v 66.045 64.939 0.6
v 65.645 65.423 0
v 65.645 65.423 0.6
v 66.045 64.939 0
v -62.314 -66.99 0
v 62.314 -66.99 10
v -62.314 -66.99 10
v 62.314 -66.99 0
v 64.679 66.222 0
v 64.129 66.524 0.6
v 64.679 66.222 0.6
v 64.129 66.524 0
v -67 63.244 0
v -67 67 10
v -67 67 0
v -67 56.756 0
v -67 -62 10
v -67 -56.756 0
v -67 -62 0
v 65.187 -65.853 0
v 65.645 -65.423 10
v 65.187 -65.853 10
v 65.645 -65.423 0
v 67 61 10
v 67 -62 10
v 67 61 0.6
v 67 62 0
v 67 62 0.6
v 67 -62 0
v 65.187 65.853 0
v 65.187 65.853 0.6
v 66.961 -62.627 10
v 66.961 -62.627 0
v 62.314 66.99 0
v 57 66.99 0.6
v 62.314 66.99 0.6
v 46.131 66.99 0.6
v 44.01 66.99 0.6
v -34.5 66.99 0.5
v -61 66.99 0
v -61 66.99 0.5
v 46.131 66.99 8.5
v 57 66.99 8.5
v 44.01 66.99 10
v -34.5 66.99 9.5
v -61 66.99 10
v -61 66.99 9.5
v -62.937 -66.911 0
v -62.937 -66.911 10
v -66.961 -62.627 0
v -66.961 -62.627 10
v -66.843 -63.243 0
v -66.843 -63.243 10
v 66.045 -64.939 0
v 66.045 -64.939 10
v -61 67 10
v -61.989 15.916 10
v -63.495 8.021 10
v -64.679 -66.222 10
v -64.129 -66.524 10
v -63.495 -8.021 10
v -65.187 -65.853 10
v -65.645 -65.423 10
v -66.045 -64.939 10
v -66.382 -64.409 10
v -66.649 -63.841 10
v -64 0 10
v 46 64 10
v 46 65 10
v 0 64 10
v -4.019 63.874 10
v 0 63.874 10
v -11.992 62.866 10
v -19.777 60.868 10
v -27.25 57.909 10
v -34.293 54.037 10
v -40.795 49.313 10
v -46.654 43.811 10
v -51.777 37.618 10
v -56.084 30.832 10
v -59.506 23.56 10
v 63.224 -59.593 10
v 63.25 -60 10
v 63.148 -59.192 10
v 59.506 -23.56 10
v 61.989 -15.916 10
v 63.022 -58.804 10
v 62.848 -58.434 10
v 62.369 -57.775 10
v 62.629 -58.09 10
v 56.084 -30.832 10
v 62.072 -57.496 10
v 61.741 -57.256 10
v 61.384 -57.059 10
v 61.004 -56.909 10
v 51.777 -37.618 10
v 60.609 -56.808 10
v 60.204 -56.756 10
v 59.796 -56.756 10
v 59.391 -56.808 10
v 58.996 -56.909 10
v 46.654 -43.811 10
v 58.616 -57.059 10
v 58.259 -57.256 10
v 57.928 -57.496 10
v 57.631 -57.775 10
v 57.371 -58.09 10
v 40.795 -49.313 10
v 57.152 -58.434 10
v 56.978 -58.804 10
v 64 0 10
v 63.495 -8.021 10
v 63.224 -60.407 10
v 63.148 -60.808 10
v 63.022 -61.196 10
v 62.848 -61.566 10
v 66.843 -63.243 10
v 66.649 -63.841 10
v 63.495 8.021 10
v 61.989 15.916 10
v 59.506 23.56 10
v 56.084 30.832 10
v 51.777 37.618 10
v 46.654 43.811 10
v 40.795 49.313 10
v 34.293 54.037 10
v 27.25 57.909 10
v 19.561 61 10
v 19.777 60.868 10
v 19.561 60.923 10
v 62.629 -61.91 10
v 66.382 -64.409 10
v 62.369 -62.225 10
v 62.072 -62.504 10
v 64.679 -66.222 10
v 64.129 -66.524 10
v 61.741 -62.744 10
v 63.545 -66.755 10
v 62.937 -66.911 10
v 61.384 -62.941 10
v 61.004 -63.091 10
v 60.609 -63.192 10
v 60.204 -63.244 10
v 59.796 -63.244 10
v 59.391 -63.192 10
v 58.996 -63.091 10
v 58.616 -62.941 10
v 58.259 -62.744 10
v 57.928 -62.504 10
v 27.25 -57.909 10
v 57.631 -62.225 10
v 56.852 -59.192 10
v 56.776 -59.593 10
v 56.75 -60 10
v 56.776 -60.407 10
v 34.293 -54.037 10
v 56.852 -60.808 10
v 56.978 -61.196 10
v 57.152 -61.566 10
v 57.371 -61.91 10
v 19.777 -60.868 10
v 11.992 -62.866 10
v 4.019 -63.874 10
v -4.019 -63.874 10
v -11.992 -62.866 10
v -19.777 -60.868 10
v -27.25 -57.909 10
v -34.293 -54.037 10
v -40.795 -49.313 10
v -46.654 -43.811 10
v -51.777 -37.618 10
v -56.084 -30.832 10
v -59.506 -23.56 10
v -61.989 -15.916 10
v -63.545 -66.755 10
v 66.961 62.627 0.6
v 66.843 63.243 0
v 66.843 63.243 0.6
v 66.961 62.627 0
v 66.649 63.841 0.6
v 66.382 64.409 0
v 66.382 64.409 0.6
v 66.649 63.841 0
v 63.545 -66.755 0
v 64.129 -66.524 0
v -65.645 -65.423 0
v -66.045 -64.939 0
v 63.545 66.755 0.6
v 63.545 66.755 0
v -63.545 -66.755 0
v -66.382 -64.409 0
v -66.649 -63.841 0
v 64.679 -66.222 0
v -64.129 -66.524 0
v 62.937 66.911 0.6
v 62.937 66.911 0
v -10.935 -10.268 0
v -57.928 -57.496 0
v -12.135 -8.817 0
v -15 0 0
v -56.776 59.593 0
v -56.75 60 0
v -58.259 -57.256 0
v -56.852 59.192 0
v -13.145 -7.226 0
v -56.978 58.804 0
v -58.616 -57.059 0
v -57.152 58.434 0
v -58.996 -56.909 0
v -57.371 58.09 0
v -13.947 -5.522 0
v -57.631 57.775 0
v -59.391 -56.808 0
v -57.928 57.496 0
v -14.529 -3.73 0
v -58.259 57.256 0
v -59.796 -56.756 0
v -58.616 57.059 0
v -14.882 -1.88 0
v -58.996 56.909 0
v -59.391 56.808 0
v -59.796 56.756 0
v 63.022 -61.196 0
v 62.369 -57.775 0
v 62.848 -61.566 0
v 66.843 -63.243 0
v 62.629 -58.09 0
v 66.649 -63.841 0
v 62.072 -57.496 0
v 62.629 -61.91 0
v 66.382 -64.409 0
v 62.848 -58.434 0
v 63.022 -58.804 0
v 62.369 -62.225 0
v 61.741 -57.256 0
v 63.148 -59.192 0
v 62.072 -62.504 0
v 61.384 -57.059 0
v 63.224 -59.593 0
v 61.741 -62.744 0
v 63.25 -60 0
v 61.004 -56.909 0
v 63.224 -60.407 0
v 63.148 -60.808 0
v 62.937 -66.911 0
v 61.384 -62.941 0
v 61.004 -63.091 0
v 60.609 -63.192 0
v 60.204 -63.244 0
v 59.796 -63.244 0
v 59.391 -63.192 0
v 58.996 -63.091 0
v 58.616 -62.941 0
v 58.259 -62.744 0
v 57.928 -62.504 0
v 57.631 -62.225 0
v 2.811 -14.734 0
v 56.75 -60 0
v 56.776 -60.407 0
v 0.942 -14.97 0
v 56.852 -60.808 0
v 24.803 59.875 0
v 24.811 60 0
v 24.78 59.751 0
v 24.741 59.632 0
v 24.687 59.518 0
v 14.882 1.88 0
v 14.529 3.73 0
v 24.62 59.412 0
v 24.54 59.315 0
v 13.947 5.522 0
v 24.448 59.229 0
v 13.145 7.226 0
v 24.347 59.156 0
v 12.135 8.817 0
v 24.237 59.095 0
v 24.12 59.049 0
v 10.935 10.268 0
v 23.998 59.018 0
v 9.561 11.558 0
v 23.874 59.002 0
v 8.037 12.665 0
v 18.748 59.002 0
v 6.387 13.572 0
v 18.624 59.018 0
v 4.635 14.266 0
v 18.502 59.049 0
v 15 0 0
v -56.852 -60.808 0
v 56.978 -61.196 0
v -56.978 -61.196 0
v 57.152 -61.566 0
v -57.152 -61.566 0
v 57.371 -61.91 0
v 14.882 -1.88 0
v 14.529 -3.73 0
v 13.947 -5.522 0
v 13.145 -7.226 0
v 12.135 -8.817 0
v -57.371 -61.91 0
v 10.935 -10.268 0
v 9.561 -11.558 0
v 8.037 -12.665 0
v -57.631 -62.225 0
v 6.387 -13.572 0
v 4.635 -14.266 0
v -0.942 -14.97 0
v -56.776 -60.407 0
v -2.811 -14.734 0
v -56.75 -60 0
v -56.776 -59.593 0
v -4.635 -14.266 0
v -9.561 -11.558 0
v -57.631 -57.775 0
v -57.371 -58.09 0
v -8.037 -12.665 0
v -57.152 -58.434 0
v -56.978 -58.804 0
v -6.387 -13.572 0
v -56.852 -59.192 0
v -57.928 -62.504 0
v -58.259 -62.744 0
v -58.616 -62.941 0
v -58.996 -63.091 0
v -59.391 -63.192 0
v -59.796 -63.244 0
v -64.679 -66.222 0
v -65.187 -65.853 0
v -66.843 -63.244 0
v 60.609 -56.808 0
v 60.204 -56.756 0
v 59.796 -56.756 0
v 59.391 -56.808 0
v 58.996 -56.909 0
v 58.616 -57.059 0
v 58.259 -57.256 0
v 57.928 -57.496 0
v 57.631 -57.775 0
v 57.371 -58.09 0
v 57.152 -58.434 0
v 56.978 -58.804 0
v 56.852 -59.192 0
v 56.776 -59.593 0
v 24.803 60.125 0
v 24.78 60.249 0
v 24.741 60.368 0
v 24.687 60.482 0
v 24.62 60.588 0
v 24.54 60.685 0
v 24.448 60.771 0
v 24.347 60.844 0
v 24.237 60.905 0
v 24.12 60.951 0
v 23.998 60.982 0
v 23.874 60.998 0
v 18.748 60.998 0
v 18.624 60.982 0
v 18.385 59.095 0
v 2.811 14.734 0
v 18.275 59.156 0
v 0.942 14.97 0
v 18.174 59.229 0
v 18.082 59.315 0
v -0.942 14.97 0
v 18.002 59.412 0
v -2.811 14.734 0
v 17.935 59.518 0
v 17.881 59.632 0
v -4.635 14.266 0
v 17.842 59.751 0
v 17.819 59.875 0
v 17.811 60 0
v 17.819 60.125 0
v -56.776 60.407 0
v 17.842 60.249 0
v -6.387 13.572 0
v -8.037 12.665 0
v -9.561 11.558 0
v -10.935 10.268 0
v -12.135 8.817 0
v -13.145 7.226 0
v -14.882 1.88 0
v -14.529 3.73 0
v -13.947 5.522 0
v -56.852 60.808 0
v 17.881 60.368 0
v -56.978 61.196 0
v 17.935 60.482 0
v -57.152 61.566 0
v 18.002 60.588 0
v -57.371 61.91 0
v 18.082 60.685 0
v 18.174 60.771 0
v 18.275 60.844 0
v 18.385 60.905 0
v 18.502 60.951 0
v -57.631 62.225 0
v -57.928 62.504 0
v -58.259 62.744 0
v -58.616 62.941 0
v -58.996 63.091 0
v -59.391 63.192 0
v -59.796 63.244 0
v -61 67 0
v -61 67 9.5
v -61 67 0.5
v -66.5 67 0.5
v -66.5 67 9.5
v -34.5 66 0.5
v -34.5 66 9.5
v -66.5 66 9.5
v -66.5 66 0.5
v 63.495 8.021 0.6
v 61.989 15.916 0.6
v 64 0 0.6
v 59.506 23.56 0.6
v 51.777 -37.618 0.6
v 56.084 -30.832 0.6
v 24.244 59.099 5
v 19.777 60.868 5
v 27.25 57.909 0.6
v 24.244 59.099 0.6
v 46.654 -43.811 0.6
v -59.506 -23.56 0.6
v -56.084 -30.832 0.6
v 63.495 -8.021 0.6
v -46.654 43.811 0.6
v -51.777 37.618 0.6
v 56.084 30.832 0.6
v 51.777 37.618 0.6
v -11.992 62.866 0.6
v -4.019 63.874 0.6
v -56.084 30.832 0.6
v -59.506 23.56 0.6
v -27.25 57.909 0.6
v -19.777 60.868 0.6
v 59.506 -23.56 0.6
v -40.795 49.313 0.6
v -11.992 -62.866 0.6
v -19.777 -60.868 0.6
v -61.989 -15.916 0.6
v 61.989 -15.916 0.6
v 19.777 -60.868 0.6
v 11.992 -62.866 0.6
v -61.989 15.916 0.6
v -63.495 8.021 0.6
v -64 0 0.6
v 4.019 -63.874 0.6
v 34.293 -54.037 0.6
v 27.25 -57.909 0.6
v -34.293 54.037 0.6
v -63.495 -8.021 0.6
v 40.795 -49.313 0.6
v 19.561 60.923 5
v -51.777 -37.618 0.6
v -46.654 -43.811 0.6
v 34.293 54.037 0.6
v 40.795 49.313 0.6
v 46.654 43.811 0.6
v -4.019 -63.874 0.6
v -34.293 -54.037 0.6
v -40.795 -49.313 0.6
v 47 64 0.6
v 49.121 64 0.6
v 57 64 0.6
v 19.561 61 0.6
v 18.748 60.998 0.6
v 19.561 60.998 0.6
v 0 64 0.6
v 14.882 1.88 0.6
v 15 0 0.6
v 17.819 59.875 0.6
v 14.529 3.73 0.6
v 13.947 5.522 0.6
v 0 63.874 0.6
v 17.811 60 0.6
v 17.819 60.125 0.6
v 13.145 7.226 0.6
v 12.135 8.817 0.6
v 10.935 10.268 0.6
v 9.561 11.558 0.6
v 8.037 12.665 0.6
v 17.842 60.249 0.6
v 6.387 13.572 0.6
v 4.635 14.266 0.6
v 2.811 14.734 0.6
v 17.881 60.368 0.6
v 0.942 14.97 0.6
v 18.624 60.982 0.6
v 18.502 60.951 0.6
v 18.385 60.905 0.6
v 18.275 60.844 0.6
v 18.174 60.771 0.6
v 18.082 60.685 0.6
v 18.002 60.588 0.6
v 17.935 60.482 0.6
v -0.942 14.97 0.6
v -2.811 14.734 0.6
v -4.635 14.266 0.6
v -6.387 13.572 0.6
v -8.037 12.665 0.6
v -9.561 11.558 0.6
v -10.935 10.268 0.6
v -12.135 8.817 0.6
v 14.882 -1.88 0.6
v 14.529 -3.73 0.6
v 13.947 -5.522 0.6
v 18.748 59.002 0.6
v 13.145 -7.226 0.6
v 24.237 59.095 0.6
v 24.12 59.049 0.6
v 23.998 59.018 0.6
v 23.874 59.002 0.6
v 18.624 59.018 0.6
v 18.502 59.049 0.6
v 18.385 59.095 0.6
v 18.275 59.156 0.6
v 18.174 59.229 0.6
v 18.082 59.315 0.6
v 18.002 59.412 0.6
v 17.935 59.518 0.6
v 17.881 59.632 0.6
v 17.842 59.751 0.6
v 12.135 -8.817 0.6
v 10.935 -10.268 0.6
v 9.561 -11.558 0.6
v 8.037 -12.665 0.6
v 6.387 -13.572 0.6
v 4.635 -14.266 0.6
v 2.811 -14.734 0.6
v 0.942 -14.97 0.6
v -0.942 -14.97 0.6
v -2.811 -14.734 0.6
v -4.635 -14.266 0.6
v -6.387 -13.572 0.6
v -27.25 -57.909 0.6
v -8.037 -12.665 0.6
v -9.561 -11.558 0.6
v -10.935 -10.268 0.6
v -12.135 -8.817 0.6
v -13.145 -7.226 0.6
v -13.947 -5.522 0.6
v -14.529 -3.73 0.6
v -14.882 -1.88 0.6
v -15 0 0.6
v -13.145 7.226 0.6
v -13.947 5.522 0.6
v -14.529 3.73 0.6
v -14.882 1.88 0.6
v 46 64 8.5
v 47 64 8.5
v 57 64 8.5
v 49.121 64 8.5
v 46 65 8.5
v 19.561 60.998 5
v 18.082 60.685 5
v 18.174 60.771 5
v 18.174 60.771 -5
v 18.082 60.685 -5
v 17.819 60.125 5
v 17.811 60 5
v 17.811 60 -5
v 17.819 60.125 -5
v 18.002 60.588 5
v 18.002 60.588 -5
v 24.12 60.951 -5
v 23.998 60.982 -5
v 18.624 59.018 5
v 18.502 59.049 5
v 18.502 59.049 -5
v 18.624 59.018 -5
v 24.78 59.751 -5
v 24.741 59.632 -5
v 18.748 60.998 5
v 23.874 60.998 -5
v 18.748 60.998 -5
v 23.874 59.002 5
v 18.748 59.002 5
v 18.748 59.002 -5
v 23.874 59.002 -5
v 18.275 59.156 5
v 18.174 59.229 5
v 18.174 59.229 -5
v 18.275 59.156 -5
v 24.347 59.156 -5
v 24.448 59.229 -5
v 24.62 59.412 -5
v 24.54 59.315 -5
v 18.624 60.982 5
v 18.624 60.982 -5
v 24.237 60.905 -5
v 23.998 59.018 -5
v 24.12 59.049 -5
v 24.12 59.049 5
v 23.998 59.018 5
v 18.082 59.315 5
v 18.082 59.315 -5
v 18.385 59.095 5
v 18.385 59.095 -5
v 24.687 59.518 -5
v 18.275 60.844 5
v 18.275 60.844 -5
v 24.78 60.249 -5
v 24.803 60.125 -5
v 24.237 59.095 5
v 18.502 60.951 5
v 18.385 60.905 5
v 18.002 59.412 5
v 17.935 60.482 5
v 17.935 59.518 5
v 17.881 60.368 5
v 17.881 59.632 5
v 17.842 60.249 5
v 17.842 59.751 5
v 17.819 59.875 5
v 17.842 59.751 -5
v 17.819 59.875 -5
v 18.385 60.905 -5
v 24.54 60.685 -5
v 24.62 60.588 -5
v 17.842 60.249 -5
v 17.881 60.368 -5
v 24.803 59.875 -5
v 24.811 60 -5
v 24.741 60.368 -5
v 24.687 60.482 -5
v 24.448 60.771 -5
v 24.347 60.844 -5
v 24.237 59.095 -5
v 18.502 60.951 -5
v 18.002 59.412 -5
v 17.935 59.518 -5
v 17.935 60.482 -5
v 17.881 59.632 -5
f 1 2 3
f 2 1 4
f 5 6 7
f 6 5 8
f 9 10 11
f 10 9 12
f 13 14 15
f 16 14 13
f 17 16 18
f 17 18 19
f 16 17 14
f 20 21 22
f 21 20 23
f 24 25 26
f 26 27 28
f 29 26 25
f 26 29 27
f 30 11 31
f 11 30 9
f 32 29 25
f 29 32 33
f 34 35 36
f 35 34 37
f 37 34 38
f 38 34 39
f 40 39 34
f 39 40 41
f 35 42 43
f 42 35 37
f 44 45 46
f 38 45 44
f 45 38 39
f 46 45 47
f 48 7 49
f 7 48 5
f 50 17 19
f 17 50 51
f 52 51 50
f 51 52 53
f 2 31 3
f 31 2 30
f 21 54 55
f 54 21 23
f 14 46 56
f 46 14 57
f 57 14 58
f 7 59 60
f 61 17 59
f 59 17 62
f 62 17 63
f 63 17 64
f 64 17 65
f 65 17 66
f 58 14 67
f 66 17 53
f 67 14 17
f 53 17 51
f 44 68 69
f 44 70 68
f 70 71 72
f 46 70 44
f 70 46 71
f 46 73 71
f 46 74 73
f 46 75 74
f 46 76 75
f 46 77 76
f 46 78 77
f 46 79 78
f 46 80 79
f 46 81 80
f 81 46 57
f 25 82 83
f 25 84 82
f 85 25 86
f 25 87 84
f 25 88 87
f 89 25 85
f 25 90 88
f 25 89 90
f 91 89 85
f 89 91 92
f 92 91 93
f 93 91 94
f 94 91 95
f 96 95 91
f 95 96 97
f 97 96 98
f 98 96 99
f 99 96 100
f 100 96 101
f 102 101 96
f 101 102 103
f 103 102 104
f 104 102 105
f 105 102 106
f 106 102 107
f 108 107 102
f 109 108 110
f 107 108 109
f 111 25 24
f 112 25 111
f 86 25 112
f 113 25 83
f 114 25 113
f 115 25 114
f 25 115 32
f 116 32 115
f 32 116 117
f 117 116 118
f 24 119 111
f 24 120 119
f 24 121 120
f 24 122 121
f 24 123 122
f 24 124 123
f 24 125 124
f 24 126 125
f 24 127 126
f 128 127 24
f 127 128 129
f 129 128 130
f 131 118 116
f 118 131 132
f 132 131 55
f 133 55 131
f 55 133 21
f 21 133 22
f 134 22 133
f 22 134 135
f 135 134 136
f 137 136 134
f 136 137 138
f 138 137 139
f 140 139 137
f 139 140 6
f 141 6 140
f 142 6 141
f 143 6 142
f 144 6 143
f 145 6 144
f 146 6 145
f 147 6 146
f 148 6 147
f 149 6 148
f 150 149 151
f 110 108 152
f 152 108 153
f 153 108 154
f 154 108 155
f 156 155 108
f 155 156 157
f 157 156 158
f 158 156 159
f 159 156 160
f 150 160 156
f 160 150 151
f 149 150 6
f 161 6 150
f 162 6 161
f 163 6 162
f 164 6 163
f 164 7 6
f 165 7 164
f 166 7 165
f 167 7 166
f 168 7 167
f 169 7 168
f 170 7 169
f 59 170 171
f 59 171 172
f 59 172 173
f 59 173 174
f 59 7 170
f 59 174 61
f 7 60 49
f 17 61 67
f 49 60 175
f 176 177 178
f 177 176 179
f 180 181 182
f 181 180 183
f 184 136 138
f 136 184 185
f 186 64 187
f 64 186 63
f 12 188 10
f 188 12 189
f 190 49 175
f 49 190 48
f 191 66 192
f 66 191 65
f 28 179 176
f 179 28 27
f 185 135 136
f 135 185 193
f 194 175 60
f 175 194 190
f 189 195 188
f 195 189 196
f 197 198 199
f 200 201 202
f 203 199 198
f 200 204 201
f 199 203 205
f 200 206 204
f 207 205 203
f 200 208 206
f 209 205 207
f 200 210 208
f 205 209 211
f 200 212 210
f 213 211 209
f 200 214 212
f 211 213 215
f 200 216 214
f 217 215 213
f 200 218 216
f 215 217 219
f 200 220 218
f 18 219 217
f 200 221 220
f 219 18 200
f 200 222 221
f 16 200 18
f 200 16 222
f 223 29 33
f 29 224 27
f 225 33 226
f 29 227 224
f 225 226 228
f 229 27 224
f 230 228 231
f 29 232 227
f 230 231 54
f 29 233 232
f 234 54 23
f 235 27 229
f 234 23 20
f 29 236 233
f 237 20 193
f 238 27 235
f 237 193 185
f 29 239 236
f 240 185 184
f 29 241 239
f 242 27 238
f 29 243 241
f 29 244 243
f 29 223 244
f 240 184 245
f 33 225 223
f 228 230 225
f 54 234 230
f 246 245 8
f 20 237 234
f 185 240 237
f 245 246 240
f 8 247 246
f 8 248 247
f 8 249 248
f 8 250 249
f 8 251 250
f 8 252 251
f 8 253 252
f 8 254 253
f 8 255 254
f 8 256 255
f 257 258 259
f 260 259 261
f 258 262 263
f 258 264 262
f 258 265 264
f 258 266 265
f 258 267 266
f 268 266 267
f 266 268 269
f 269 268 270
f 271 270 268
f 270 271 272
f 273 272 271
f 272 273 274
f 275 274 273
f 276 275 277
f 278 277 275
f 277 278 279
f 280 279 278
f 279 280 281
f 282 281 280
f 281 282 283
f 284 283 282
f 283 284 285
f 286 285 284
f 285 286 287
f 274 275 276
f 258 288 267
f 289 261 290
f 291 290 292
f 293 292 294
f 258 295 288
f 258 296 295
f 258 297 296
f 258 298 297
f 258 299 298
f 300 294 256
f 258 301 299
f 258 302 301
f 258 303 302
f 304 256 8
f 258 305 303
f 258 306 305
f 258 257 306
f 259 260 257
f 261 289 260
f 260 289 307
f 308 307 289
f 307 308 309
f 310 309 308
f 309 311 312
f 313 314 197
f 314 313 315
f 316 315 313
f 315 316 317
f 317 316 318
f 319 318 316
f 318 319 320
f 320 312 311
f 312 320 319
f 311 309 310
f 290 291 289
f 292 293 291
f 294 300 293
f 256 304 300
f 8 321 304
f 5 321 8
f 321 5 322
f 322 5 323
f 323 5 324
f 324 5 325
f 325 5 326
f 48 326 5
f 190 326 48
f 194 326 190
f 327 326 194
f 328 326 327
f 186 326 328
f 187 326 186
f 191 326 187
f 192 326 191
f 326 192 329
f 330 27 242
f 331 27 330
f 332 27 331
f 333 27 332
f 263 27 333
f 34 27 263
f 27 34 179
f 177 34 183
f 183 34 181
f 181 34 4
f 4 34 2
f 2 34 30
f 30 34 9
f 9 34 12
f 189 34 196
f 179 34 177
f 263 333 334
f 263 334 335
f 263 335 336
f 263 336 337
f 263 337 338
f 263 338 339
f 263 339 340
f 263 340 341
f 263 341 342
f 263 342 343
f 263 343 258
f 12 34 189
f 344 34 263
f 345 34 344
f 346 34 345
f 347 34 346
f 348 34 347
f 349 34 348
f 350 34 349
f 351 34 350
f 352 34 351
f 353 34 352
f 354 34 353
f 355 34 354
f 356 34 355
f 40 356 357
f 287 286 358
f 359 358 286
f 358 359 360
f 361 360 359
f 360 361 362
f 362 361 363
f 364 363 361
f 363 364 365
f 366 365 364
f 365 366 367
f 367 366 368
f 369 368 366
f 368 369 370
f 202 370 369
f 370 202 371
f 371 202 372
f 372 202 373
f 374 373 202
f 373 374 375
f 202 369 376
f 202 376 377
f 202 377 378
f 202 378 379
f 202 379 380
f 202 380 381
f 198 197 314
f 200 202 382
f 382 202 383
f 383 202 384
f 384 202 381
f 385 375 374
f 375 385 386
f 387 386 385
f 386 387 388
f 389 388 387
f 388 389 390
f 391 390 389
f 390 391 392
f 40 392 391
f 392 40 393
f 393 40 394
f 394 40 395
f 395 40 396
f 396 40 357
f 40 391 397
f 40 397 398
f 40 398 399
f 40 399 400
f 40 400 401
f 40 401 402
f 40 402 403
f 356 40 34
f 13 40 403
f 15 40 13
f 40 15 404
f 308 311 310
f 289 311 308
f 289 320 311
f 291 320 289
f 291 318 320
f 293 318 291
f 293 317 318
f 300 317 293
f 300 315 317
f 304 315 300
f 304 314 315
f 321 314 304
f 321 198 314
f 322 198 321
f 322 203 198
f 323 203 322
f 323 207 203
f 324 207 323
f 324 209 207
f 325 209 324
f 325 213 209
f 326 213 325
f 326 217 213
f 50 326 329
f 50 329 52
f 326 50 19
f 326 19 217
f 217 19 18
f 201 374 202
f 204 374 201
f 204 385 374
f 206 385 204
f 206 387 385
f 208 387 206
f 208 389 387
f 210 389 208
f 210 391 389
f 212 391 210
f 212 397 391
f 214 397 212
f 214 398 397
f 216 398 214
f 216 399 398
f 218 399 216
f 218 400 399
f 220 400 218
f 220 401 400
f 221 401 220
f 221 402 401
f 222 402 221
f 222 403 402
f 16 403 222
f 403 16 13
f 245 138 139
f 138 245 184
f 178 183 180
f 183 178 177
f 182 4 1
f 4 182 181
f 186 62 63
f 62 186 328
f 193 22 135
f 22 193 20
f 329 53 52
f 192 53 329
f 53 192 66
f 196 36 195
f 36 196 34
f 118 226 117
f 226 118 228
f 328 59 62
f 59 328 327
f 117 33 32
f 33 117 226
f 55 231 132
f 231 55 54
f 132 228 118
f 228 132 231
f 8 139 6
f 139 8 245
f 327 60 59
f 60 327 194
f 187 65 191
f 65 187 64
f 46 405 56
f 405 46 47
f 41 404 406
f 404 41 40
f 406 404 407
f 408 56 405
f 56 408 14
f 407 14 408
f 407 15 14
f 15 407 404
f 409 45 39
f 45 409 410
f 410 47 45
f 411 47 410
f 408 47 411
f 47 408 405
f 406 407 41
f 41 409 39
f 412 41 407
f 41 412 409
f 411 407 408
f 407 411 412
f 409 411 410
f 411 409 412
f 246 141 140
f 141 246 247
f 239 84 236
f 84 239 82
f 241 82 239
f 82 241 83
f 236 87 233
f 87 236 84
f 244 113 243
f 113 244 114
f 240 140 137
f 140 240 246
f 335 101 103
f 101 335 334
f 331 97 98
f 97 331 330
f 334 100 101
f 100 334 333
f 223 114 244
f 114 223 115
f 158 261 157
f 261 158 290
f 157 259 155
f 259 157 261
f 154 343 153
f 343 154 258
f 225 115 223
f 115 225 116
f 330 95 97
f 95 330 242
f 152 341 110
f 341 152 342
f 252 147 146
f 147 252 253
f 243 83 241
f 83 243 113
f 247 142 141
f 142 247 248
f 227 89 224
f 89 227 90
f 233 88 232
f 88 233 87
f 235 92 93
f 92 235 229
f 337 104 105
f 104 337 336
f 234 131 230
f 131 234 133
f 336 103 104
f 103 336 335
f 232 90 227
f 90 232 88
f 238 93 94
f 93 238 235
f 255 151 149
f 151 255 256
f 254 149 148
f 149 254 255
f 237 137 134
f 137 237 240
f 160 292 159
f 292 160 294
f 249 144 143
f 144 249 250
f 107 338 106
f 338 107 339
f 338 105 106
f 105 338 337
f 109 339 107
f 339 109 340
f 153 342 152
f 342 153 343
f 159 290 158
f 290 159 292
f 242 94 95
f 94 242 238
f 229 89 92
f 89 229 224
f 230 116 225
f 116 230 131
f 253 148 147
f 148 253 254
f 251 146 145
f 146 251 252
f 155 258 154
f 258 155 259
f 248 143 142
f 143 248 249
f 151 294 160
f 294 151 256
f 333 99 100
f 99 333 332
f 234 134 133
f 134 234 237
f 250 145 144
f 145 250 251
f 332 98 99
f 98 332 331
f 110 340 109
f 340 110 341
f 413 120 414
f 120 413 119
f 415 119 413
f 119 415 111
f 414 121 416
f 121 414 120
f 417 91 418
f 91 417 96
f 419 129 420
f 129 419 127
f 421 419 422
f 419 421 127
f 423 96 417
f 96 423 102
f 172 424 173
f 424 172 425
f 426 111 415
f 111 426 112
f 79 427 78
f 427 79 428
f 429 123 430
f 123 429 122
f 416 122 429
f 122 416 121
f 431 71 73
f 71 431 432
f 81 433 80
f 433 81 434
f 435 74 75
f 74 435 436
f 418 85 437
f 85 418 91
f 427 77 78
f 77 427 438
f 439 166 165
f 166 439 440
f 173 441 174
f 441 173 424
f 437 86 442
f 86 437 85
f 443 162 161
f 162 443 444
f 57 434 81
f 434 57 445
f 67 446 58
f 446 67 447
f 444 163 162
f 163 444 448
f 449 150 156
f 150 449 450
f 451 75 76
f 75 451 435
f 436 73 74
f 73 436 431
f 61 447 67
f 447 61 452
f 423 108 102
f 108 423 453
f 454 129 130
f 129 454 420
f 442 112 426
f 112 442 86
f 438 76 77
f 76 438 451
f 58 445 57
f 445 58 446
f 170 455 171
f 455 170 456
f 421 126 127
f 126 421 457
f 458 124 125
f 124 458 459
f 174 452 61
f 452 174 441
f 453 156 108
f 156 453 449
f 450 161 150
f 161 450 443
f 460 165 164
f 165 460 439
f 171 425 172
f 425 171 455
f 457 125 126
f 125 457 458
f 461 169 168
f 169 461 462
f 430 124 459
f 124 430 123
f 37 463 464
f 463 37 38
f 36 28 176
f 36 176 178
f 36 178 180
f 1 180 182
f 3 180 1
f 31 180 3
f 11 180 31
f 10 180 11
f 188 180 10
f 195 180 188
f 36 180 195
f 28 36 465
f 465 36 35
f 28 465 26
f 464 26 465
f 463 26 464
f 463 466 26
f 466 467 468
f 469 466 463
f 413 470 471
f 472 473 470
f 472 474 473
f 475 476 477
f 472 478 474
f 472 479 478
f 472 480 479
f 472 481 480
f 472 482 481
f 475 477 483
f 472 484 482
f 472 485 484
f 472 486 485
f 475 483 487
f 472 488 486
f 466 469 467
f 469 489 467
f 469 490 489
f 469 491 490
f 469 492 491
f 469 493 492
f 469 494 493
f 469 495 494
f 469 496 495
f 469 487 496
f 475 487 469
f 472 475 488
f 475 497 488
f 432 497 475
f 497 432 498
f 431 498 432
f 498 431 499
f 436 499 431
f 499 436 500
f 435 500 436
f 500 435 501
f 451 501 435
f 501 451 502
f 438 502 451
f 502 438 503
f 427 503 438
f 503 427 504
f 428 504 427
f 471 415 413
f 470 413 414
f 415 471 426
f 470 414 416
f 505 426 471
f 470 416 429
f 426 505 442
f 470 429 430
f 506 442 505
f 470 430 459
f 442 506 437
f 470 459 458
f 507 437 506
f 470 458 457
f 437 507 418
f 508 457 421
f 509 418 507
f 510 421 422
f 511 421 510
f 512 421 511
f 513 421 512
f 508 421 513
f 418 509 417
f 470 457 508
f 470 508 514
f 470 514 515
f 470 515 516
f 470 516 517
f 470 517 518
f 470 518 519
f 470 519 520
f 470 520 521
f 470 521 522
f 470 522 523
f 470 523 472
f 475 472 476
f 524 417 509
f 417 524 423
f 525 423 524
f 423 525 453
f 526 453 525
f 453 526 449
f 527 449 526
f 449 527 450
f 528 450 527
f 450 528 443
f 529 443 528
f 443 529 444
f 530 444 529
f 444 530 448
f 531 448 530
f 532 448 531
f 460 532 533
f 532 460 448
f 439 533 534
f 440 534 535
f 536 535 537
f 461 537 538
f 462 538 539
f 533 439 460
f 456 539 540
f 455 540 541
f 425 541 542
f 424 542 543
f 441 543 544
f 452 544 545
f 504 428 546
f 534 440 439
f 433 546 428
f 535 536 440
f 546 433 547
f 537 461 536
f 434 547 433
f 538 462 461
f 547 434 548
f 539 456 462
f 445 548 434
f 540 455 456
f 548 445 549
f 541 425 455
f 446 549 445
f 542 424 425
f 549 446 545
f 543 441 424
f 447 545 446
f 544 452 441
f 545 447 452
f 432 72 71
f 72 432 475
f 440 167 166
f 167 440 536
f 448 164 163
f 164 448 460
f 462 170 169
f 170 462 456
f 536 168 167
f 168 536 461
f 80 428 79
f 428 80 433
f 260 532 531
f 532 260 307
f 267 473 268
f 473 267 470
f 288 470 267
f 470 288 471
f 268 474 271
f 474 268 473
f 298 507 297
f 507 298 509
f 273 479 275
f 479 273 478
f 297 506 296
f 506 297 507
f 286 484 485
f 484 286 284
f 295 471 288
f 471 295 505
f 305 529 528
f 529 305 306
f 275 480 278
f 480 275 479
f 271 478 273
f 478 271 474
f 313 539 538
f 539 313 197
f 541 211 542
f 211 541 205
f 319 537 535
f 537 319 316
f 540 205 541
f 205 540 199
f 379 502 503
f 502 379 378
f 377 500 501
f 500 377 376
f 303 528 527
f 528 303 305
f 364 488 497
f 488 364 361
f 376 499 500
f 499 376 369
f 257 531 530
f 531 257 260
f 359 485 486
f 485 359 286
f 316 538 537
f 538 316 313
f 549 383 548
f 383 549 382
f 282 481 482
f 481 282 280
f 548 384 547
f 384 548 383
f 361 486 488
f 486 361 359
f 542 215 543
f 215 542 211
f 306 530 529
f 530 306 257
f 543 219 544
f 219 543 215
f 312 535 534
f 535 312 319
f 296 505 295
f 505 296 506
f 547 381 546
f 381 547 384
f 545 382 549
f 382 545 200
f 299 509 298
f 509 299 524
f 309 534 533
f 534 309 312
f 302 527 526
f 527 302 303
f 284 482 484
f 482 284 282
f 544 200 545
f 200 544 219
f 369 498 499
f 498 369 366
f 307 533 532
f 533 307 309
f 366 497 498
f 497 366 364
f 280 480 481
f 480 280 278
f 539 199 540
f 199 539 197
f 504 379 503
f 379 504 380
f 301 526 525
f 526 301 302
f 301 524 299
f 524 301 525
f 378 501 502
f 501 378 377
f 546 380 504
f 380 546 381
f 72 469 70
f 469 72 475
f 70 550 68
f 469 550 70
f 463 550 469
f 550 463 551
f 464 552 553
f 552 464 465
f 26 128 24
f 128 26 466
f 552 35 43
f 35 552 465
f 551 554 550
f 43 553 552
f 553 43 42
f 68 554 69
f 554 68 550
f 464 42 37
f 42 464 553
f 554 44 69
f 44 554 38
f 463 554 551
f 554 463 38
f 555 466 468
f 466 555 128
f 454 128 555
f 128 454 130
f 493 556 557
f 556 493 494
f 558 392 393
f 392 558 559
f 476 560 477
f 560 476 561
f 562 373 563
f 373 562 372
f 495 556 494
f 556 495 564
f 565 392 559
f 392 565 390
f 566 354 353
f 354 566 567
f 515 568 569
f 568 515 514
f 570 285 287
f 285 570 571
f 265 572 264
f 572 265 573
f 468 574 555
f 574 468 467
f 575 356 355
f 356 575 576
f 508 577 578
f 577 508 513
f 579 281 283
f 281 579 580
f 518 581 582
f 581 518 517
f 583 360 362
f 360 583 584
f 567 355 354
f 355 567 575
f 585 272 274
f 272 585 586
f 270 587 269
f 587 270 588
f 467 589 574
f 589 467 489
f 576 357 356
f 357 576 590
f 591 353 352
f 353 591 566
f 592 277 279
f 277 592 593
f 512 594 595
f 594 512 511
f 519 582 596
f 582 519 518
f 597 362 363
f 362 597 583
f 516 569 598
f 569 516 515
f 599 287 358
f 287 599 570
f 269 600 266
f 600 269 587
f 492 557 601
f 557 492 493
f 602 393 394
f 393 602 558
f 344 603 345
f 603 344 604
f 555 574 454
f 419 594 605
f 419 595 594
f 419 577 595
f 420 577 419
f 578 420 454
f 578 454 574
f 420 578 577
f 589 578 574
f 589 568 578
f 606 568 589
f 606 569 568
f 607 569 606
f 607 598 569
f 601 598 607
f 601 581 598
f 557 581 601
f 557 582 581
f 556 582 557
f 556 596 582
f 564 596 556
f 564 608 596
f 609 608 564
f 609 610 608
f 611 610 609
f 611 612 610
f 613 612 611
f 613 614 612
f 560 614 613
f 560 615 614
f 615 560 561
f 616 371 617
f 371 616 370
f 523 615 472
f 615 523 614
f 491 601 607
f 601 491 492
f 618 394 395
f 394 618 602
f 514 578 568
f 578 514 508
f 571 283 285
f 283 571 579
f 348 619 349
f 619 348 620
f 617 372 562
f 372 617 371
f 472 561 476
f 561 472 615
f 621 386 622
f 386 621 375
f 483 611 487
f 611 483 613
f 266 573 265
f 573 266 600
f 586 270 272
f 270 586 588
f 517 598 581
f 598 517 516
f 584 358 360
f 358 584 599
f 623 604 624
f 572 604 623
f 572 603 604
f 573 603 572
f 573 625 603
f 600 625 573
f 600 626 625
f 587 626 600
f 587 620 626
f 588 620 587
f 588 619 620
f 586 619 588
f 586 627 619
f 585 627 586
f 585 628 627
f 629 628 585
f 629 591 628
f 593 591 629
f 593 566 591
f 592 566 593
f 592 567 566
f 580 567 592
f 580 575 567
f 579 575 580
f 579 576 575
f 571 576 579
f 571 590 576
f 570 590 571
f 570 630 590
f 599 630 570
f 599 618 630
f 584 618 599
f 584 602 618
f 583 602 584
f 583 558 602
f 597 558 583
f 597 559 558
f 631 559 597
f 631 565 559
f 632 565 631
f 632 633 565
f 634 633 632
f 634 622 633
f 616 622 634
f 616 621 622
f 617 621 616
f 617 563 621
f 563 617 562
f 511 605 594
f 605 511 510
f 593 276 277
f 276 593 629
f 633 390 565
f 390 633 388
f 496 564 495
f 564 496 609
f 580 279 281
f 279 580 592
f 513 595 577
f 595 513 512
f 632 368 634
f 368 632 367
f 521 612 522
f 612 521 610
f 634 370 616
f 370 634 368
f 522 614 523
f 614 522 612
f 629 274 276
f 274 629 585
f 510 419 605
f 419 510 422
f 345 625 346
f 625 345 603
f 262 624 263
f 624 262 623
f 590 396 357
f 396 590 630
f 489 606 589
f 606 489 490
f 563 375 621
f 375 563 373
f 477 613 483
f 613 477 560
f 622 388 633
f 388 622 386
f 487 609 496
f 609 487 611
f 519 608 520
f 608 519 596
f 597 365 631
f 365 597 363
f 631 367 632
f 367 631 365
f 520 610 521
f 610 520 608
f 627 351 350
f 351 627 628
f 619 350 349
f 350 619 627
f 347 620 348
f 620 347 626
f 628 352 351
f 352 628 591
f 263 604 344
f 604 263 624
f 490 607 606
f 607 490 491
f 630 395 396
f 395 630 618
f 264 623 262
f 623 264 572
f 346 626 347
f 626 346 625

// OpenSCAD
$fn = 50;


union() {
	difference() {
		union() {
			hull() {
				translate(v = [-62.0000000000, 62.0000000000, 0]) {
					cylinder(h = 10, r = 5);
				}
				translate(v = [62.0000000000, 62.0000000000, 0]) {
					cylinder(h = 10, r = 5);
				}
				translate(v = [-62.0000000000, -62.0000000000, 0]) {
					cylinder(h = 10, r = 5);
				}
				translate(v = [62.0000000000, -62.0000000000, 0]) {
					cylinder(h = 10, r = 5);
				}
			}
			translate(v = [-67.0000000000, 61.0000000000, 0]) {
				cube(size = [6, 6, 10]);
			}
		}
		union() {
			translate(v = [-67.5000000000, -60.0000000000, -250.0000000000]) {
				rotate(a = [0, 0, 0]) {
					difference() {
						union() {
							hull() {
								translate(v = [7.5000000000, 0, 0]) {
									cylinder(h = 250, r = 3.2500000000, r1 = 3.2500000000, r2 = 3.2500000000);
								}
								translate(v = [-7.5000000000, 0, 0]) {
									cylinder(h = 250, r = 3.2500000000, r1 = 3.2500000000, r2 = 3.2500000000);
								}
							}
						}
						union();
					}
				}
			}
			translate(v = [-67.5000000000, 60.0000000000, -250.0000000000]) {
				rotate(a = [0, 0, 0]) {
					difference() {
						union() {
							hull() {
								translate(v = [7.5000000000, 0, 0]) {
									cylinder(h = 250, r = 3.2500000000, r1 = 3.2500000000, r2 = 3.2500000000);
								}
								translate(v = [-7.5000000000, 0, 0]) {
									cylinder(h = 250, r = 3.2500000000, r1 = 3.2500000000, r2 = 3.2500000000);
								}
							}
						}
						union();
					}
				}
			}
			translate(v = [-66.5000000000, 66.0000000000, 0.5000000000]) {
				cube(size = [32, 1, 9.0000000000]);
			}
			translate(v = [60.0000000000, -60.0000000000, 0]) {
				cylinder(h = 100, r = 3.2500000000);
			}
			translate(v = [0, 0, 0.6000000000]) {
				cylinder(h = 12.4000000000, r = 64.0000000000);
			}
			translate(v = [0, 0, -5.0000000000]) {
				cylinder(h = 10, r = 15.0000000000);
			}
			translate(v = [0.0000000000, 61.0000000000, 0.6000000000]) {
				cube(size = [67.0000000000, 3, 12.4000000000]);
			}
			translate(v = [57.0000000000, 61.0000000000, 0.6000000000]) {
				cube(size = [10, 6, 12.4000000000]);
			}
			translate(v = [46.0000000000, 61.0000000000, 8.5000000000]) {
				cube(size = [21, 6, 1.5000000000]);
			}
			translate(v = [43.2500000000, 67.7500000000, 0.6000000000]) {
				rotate(a = [0, 0, -45]) {
					cube(size = [7.5000000000, 1.5000000000, 12.4000000000]);
				}
			}
			translate(v = [12.0610000000, 59.0000000000, 0.6000000000]) {
				cube(size = [7.5000000000, 2, 9.4000000000]);
			}
		}
	}
	union() {
		translate(v = [21.3110000000, 60.0000000000, -5.0000000000]) {
			rotate(a = [0, 0, 0]) {
				difference() {
					union() {
						#hull() {
							#translate(v = [2.5000000000, 0, 0]) {
								cylinder(h = 10, r = 1.0000000000, r1 = 1.0000000000, r2 = 1.0000000000);
							}
							#translate(v = [-2.5000000000, 0, 0]) {
								cylinder(h = 10, r = 1.0000000000, r1 = 1.0000000000, r2 = 1.0000000000);
							}
						}
					}
					union();
				}
			}
		}
	}
}
